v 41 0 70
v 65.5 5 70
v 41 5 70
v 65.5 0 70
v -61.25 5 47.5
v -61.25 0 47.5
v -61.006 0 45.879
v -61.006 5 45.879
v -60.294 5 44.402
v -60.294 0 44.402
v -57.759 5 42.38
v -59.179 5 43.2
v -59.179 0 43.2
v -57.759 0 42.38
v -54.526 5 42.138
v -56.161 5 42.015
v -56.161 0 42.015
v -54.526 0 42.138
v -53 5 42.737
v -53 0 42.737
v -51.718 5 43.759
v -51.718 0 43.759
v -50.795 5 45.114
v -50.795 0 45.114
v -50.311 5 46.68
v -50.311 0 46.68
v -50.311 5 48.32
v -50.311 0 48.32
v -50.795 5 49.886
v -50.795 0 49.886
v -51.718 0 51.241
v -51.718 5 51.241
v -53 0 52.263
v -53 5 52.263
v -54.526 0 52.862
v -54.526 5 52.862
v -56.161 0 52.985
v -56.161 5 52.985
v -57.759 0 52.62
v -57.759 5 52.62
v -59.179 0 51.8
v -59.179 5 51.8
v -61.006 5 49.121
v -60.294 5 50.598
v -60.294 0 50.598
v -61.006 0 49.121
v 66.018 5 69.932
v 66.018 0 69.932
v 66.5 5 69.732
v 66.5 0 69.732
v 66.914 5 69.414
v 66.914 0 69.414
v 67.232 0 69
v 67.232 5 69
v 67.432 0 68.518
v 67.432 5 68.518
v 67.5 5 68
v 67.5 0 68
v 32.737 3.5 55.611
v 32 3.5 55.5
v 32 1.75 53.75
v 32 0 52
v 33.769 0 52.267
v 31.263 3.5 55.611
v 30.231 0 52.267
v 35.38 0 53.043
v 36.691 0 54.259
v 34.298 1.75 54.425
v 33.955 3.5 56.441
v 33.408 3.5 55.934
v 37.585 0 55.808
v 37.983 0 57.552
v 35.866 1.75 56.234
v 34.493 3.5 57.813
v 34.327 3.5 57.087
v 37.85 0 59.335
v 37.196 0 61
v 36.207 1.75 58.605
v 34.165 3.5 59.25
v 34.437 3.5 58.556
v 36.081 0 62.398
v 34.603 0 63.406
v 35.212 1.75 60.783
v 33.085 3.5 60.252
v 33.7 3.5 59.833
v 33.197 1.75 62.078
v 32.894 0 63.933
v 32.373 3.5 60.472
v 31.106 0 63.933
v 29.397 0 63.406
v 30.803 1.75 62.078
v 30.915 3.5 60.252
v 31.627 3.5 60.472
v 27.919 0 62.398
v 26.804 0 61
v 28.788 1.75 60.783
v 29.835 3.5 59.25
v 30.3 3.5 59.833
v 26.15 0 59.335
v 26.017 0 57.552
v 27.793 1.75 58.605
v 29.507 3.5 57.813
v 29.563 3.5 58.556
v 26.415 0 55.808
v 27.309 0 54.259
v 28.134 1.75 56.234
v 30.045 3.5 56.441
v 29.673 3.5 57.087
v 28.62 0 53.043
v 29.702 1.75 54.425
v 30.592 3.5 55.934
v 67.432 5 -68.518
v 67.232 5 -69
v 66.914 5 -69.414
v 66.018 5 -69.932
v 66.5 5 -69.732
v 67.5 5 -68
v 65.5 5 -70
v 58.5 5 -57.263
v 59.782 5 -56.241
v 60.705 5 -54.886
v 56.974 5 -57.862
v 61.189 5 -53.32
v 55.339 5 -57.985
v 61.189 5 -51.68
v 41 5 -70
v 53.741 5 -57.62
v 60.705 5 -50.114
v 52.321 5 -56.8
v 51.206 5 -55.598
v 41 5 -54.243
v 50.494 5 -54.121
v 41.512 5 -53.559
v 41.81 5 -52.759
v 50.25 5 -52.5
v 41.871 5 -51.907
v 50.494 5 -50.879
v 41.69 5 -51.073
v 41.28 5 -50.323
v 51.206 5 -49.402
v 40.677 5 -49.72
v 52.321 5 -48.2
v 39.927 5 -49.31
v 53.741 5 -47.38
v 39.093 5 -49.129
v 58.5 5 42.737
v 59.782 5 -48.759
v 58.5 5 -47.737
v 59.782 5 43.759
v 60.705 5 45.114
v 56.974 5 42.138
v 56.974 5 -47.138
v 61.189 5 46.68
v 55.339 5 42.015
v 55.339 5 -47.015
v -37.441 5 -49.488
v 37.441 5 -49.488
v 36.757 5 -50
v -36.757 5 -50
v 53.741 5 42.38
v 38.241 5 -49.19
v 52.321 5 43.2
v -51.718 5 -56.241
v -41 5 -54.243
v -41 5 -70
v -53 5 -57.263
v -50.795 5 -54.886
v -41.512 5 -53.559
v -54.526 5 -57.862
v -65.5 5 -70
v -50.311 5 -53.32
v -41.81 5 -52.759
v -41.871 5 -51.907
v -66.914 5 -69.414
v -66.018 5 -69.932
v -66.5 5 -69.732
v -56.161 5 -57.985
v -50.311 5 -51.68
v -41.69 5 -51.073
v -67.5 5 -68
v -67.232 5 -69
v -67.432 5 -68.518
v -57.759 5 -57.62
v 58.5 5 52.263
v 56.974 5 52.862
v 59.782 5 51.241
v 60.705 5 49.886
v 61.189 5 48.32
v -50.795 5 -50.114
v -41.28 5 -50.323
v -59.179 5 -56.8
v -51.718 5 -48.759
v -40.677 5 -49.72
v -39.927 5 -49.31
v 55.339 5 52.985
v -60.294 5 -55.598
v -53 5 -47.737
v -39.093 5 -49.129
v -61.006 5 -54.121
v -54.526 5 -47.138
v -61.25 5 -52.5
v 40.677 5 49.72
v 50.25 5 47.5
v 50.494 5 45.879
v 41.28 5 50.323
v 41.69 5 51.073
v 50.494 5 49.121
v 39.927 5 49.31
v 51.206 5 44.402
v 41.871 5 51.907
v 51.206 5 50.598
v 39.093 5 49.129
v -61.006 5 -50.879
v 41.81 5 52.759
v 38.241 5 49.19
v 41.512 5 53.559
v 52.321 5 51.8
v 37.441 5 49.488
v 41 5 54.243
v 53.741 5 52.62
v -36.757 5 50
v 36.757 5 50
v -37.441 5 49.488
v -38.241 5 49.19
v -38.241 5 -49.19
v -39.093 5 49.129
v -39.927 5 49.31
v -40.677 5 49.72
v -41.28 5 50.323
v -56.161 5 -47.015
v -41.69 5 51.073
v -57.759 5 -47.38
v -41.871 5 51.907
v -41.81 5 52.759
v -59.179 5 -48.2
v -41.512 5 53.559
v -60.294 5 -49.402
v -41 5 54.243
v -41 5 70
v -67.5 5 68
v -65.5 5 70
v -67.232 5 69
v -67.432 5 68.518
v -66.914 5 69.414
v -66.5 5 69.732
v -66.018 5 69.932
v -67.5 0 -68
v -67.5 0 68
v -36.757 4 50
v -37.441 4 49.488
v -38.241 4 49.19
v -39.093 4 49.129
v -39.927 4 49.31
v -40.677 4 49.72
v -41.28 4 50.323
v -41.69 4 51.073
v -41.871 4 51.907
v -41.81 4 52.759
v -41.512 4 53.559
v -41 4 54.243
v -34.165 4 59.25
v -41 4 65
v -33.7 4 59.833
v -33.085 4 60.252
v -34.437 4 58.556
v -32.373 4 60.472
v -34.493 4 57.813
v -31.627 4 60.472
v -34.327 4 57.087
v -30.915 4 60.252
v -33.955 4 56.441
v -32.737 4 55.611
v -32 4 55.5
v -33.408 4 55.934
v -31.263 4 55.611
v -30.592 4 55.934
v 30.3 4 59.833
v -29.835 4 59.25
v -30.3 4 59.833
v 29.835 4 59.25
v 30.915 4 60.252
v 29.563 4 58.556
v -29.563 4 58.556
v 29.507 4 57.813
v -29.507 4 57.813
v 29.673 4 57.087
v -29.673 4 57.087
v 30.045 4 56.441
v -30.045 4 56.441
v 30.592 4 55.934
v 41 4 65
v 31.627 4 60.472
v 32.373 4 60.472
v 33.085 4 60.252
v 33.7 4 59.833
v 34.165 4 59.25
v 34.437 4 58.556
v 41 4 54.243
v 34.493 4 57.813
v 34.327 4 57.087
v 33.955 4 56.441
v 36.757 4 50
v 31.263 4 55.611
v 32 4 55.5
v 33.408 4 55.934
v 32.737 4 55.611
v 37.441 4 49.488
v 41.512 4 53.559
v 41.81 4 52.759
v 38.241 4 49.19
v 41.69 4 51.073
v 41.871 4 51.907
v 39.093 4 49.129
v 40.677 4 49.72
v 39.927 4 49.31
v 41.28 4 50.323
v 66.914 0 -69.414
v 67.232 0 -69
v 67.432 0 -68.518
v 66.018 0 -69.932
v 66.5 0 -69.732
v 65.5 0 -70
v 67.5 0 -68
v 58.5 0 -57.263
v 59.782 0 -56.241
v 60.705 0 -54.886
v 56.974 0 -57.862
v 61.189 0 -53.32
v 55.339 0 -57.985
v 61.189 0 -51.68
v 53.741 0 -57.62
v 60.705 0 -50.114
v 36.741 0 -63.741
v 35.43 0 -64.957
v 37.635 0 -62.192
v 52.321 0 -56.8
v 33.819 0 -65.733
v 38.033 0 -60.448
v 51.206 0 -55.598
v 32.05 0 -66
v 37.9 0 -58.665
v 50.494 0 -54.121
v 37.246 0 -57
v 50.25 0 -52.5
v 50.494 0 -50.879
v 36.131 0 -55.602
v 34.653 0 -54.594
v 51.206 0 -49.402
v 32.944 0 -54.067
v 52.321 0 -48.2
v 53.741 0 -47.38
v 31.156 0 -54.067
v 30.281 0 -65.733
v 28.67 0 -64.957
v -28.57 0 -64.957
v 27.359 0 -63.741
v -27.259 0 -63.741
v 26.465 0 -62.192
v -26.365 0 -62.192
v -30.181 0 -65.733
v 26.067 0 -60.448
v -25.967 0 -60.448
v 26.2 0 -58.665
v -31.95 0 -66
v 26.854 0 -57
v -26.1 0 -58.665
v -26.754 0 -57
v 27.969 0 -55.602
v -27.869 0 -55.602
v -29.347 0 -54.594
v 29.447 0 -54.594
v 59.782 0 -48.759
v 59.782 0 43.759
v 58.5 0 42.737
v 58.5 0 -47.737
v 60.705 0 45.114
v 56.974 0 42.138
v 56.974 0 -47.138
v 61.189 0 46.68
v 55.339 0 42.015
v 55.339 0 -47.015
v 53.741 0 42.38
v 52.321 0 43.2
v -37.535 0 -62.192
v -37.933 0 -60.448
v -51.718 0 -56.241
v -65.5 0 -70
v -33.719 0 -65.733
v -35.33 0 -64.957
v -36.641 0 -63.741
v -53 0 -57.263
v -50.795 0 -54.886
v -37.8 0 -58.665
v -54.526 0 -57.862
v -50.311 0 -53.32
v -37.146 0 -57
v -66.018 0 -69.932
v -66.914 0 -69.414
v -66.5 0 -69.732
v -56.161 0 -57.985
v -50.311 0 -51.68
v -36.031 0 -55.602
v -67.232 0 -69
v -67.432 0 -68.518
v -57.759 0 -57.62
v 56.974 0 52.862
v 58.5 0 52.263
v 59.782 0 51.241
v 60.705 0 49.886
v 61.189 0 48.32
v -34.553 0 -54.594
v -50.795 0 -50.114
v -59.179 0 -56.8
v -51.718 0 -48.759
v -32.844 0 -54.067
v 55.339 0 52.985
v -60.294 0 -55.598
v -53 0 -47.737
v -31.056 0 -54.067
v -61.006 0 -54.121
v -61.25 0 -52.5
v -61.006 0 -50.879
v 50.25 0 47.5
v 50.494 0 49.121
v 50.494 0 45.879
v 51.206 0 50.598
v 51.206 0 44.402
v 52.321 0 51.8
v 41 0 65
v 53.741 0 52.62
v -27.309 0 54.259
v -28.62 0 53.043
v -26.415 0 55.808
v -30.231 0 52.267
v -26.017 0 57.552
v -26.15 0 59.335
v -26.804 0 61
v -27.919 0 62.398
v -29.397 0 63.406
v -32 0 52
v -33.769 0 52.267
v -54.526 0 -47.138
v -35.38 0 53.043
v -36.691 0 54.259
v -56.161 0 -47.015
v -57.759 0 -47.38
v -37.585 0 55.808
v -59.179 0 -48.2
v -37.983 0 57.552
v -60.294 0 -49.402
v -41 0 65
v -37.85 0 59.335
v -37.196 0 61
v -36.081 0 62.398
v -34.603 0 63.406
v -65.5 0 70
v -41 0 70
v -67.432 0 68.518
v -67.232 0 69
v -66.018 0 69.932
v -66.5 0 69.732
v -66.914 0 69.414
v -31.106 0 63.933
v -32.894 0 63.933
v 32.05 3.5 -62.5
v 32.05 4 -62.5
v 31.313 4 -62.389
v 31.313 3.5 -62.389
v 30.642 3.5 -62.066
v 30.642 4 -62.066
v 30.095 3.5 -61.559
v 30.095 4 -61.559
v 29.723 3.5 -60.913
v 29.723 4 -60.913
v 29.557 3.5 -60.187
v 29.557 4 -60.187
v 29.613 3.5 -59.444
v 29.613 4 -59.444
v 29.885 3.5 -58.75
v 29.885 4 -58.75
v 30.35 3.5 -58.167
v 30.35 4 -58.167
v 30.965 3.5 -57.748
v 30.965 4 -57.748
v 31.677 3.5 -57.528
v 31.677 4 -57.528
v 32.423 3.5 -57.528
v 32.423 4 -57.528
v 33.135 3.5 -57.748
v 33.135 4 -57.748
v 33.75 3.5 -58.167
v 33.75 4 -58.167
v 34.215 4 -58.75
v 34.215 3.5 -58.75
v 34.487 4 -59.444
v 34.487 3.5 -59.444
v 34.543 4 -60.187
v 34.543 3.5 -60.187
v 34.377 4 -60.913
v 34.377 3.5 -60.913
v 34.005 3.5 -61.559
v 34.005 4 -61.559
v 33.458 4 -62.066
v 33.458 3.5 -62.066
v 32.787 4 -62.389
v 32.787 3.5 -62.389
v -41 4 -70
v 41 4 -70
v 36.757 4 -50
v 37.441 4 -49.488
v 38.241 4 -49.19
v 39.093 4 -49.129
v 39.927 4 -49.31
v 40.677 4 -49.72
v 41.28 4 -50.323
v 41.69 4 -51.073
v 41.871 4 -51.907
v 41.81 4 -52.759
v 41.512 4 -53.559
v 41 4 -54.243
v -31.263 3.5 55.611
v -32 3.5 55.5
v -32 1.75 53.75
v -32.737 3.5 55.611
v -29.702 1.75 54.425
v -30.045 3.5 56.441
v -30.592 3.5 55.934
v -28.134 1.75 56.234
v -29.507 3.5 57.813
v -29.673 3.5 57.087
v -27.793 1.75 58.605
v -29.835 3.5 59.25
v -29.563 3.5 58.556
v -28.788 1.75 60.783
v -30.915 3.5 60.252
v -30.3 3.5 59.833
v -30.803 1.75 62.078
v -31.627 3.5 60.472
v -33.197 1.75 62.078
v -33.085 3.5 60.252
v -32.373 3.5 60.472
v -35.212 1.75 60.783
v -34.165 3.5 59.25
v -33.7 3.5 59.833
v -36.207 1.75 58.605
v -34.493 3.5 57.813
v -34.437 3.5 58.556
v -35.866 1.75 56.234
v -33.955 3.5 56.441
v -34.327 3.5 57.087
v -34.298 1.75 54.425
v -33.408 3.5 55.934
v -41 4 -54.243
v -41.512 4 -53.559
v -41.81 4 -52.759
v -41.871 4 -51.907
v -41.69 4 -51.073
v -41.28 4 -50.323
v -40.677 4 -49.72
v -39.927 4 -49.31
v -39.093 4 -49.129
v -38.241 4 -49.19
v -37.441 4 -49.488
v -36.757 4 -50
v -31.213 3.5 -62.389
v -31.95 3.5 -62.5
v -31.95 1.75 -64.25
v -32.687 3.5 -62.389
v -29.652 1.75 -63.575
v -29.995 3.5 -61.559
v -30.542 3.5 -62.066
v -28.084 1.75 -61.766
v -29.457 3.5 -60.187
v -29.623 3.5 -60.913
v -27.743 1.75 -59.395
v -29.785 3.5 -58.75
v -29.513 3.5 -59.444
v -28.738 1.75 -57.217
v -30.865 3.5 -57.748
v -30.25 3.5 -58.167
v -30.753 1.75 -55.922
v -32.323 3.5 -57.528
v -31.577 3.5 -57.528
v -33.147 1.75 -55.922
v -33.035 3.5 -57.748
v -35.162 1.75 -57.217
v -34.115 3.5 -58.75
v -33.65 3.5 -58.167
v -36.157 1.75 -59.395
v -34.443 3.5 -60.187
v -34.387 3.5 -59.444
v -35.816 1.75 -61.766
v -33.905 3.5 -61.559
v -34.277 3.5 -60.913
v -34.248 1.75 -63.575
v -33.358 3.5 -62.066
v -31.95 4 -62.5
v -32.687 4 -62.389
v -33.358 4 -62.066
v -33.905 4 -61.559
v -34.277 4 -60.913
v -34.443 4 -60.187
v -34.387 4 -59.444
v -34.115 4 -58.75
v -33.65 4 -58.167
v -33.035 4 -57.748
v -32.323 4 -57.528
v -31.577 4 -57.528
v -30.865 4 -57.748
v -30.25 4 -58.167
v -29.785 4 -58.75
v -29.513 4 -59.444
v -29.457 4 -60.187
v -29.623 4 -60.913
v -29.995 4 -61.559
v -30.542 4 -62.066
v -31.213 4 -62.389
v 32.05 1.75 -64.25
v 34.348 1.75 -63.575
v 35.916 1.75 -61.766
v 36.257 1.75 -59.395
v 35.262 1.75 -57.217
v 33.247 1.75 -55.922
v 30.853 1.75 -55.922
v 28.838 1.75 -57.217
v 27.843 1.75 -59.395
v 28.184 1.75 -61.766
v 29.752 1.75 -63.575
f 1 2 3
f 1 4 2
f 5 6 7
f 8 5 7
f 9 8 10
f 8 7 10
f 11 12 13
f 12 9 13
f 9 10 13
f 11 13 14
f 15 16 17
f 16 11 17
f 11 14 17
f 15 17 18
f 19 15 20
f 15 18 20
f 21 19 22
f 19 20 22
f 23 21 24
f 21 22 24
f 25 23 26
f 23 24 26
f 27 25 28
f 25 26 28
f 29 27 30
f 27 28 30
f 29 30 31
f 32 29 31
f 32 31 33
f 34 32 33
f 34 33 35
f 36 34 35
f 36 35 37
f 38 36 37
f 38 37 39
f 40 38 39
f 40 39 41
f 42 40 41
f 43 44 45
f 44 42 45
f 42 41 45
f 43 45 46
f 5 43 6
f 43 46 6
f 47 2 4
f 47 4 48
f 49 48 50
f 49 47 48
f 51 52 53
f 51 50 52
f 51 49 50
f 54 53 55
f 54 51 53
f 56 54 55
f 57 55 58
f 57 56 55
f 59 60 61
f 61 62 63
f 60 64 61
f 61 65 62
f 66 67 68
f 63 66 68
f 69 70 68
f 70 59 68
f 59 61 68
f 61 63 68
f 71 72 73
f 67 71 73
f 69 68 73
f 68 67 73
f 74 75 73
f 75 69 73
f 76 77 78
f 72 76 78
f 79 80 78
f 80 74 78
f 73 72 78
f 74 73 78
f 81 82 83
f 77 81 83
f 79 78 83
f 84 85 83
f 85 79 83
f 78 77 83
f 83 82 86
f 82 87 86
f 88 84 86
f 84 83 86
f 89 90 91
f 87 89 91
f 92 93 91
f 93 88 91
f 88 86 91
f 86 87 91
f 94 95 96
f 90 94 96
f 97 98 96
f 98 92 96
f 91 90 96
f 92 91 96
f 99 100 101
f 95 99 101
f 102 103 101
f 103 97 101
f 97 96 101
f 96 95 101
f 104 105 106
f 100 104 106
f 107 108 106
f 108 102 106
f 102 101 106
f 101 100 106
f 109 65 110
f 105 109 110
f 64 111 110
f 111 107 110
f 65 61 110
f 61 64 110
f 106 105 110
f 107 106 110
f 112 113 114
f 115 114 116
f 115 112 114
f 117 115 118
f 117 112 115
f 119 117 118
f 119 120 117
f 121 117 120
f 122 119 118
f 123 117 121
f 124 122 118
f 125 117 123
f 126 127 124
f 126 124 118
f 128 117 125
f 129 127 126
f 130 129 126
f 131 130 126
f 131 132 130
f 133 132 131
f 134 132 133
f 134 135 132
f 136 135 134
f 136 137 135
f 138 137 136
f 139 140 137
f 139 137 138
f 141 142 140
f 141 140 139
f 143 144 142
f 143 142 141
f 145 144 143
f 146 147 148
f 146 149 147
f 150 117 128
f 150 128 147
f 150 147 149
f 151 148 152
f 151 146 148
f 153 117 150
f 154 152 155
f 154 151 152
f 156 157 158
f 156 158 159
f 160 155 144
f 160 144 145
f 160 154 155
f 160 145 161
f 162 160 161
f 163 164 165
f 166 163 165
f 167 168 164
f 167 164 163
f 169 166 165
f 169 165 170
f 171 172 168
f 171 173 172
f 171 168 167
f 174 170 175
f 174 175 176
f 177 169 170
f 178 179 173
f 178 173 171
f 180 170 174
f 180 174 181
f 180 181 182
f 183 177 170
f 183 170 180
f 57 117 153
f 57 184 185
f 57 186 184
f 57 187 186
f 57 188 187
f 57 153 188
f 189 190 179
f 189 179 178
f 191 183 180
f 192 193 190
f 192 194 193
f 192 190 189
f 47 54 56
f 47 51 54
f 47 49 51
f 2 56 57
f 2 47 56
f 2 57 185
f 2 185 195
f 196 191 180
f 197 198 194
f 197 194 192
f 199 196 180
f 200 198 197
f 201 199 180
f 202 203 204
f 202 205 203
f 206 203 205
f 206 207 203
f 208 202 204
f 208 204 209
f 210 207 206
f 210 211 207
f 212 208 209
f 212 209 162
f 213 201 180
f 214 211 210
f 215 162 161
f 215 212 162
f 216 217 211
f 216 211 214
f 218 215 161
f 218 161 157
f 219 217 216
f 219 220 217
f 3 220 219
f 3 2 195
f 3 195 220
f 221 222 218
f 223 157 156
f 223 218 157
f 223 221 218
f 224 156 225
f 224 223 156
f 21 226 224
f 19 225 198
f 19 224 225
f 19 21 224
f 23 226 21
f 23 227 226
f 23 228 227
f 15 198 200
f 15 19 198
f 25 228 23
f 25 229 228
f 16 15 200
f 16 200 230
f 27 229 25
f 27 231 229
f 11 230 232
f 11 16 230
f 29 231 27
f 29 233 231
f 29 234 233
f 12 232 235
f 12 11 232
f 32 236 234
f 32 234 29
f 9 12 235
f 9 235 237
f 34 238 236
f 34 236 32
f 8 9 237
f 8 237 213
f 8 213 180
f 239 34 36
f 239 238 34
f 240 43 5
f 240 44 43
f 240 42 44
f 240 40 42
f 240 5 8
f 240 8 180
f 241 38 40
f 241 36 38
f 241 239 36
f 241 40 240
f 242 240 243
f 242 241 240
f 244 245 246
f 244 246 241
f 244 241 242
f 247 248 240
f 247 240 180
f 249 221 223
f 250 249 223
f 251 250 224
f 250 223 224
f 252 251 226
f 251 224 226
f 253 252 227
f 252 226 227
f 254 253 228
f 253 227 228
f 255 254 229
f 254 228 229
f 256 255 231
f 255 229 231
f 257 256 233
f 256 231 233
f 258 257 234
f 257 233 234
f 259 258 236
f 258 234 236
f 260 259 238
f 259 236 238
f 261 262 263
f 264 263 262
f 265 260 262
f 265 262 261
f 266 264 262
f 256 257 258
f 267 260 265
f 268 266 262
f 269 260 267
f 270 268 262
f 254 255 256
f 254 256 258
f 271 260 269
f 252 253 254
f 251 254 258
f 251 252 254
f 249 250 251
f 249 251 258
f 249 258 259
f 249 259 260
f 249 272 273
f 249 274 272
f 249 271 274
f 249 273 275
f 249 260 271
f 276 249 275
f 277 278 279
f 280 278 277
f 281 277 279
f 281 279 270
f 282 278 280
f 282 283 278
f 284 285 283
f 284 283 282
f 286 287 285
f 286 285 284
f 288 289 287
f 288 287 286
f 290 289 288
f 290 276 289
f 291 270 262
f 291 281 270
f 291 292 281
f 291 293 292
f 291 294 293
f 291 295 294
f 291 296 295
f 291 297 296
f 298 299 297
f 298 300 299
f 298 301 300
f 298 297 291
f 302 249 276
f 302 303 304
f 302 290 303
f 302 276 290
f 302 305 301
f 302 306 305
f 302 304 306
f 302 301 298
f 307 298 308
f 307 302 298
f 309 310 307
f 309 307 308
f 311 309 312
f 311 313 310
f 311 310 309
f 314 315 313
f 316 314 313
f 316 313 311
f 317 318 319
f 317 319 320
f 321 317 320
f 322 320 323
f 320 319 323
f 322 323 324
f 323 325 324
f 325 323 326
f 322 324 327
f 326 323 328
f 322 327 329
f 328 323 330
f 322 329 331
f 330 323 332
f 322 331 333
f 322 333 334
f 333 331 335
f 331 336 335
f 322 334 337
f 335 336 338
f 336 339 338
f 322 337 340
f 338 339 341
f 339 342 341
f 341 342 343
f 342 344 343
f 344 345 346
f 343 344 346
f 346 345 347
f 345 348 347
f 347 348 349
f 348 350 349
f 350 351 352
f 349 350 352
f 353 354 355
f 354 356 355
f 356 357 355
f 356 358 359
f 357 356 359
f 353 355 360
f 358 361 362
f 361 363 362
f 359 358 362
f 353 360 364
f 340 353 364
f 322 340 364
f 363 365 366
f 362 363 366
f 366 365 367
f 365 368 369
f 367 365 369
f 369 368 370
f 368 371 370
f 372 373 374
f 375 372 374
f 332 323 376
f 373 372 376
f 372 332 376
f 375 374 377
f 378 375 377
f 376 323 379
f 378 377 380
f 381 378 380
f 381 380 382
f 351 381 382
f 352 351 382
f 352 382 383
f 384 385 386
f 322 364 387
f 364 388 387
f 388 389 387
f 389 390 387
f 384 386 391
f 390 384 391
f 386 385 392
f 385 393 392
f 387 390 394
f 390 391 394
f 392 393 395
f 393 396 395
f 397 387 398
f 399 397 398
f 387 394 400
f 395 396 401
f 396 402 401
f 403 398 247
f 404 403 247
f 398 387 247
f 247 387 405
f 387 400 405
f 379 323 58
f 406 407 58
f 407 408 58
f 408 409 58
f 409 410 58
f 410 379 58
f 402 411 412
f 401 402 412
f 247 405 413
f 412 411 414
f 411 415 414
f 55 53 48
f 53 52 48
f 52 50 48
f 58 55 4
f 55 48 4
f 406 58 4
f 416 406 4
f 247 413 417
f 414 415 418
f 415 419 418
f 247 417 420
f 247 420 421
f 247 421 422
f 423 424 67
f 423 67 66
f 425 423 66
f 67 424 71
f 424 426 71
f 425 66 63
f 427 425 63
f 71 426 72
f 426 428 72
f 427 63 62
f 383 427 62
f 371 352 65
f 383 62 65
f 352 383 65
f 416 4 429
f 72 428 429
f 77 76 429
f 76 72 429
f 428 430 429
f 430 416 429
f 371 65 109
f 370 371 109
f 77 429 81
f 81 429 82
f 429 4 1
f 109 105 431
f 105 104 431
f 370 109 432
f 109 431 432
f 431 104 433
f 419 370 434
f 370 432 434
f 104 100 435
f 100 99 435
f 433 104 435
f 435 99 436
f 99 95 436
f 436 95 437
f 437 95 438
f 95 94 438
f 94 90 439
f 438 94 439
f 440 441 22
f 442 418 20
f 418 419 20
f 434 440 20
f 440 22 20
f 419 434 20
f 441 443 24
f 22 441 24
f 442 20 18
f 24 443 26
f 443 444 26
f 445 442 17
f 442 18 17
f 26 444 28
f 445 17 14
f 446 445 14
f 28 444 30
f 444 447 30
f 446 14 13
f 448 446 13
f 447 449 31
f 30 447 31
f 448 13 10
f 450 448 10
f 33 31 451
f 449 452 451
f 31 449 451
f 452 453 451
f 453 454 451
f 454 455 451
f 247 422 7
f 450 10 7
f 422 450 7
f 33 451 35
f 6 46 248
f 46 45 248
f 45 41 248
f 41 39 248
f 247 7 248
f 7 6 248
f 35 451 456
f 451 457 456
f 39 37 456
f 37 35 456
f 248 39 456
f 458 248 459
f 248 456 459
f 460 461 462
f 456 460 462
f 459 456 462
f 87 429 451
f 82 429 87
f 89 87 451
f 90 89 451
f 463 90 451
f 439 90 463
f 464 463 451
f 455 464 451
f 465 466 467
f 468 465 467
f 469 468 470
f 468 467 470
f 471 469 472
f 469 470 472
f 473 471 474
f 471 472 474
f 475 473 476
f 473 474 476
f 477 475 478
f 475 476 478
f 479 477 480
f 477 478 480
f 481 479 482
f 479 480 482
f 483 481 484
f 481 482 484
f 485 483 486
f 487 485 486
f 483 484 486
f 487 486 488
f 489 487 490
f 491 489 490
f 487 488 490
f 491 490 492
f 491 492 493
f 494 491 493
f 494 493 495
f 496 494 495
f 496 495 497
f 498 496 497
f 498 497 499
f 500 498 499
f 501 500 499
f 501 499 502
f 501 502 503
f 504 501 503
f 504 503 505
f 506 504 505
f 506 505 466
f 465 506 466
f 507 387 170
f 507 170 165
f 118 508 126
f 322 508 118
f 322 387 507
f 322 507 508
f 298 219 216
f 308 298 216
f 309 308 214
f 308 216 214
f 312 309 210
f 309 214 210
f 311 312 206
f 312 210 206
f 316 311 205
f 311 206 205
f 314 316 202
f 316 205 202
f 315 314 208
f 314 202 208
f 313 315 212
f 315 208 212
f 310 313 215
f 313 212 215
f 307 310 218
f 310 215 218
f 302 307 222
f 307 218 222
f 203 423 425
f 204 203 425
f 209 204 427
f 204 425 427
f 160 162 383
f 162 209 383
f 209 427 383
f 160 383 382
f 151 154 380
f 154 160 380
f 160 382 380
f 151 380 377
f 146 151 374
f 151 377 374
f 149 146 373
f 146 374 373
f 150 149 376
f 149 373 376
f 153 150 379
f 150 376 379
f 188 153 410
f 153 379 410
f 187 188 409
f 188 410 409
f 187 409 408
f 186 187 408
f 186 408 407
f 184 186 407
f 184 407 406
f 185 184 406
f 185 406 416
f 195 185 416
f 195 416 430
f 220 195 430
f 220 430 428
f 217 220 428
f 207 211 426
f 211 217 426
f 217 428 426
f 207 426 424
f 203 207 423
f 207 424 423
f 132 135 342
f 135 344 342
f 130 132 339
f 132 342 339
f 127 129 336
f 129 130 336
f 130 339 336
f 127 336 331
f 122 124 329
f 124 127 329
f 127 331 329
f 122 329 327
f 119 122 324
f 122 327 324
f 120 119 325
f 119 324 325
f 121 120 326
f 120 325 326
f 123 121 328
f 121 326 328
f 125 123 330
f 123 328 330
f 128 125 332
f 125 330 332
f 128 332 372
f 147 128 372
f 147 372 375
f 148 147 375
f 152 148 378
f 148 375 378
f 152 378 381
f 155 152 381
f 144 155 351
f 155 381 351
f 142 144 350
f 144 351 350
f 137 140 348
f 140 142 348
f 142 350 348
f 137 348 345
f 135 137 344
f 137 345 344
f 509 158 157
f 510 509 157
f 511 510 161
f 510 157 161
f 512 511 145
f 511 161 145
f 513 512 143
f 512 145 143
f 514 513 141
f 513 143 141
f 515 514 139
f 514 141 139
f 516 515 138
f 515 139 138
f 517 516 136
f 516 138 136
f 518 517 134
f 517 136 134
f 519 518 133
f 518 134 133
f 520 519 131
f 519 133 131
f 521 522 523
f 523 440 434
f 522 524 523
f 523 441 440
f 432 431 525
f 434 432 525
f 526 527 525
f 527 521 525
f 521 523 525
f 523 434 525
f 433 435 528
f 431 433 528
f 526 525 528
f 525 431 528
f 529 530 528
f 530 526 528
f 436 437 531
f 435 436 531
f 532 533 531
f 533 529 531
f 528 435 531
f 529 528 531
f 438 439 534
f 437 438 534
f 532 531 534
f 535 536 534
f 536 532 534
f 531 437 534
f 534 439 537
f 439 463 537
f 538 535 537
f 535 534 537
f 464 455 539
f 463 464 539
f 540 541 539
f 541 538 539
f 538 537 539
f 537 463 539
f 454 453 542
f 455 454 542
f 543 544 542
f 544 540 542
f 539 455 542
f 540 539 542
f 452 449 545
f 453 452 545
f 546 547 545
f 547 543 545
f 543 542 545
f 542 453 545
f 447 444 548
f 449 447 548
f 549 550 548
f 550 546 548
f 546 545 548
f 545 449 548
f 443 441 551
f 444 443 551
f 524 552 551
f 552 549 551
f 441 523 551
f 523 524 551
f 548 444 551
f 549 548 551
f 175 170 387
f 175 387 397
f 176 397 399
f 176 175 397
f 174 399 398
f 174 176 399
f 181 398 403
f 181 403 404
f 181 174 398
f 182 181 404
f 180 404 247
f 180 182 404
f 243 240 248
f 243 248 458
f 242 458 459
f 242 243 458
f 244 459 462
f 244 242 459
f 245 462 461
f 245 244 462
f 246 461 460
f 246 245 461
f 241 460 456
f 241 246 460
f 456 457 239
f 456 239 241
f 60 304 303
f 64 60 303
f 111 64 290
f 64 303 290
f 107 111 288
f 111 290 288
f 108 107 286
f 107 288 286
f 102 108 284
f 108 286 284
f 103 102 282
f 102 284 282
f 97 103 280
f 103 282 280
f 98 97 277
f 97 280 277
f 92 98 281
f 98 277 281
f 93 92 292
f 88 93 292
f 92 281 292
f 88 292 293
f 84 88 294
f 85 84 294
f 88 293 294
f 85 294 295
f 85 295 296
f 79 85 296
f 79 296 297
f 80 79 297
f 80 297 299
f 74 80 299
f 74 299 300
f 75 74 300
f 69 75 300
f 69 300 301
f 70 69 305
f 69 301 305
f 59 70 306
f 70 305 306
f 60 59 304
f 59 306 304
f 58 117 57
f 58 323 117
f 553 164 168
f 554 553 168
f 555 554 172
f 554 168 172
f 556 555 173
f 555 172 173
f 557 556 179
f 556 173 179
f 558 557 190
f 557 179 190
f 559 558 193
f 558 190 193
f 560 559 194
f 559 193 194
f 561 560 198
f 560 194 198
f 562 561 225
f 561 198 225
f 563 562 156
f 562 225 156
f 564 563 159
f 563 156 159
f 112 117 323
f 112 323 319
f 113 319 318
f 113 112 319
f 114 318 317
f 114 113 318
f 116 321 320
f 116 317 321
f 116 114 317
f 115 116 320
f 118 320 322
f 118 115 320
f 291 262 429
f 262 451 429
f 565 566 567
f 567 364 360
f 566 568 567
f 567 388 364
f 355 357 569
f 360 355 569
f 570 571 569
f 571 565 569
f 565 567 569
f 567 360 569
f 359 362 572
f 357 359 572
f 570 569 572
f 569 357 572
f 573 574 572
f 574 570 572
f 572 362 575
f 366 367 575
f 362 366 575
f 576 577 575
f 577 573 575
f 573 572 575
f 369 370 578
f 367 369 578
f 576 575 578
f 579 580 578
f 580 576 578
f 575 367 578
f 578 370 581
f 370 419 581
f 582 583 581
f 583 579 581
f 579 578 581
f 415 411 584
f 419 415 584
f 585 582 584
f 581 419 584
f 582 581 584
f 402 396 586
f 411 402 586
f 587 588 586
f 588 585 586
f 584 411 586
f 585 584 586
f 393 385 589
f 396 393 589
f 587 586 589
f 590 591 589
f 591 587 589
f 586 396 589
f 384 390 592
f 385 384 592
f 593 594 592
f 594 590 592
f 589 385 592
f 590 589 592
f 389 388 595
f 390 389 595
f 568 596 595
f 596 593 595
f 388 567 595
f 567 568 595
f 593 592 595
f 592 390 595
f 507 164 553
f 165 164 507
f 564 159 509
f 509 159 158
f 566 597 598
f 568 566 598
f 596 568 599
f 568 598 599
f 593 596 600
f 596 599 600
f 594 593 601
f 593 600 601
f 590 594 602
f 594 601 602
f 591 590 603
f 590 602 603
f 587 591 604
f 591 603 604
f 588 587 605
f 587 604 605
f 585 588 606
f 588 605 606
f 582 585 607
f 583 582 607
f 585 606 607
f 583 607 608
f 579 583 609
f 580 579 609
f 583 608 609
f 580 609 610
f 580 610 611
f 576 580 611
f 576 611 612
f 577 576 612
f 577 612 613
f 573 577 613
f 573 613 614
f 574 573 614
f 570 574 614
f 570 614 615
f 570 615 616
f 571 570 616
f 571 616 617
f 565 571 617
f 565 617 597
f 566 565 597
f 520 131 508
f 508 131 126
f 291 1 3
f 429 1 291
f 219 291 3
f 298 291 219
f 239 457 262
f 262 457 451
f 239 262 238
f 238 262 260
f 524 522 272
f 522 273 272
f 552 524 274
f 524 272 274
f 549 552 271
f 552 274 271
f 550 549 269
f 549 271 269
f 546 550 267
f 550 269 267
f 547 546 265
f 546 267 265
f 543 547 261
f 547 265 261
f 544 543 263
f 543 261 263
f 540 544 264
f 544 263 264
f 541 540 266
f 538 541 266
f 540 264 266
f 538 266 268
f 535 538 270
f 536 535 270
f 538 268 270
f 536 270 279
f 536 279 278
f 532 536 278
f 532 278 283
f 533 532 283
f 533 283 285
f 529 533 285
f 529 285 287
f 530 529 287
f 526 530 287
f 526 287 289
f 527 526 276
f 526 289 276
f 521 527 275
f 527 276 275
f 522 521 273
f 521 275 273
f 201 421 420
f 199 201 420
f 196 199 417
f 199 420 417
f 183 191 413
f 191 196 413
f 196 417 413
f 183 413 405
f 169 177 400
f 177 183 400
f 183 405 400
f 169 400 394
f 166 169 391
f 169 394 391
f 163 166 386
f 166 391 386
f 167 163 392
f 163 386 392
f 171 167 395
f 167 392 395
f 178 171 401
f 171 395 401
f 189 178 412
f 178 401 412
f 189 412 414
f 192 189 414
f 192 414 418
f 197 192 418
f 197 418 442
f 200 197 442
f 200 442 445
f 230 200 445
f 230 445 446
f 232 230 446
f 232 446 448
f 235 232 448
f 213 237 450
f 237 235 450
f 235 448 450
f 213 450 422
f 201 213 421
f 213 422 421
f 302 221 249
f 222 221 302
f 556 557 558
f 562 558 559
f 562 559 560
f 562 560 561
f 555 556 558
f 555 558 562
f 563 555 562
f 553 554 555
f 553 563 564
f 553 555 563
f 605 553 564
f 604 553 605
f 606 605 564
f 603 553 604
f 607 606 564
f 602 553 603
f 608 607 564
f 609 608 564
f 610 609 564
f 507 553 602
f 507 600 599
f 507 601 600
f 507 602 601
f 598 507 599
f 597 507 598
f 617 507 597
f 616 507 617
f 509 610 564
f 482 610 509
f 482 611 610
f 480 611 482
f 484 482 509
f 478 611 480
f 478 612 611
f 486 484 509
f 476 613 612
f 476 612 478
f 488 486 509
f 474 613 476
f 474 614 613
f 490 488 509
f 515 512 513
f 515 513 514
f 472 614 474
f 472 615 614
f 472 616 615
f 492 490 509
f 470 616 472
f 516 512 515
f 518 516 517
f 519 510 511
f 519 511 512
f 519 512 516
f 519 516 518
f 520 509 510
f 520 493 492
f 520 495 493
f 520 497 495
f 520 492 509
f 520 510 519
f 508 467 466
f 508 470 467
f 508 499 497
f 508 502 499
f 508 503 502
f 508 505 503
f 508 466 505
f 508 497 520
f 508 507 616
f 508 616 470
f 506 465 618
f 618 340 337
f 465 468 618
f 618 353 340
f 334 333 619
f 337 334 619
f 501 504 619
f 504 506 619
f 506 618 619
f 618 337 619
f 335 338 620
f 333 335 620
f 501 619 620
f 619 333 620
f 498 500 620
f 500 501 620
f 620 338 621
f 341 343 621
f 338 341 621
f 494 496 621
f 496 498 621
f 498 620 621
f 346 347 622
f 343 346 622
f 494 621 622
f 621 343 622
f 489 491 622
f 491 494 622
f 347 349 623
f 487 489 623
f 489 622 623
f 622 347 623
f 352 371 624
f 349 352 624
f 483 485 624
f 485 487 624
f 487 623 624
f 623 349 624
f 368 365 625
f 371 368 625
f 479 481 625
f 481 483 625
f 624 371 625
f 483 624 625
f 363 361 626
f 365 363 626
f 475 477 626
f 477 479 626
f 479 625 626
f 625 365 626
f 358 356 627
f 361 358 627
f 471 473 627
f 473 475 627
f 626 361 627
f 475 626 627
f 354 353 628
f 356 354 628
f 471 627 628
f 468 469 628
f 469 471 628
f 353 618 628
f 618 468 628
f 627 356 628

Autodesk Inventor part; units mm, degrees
ref_plane "YZ Plane" through (0, 0, 0) normal (1, 0, 0) x (0, 1, 0)
ref_plane "XZ Plane" through (0, 0, 0) normal (0, 1, 0) x (-1, 0, 0)
ref_plane "XY Plane" through (0, 0, 0) normal (0, 0, 1) x (1, 0, 0)
sketch "Sketch1" plane through (0, 0, 0) normal (0, 1, 0) x (-1, 0, 0)
  line L0 (67.5, -70) -> (-67.5, -70)
  line L1 (-67.5, -70) -> (-67.5, 70)
  line L2 (-67.5, 70) -> (67.5, 70)
  line L3 (67.5, 70) -> (67.5, -70)
  line L4 (67.5, -70) -> (-67.5, 70) construction
  line L5 (-67.5, -70) -> (67.5, 70) construction
  circle A0 centre (-55.75, -52.5) radius 5.5
  circle A1 centre (55.75, -52.5) radius 5.5
  circle A2 centre (55.75, 47.5) radius 5.5
  circle A3 centre (-55.75, 47.5) radius 5.5
  line L6 (55.75, -52.5) -> (-55.75, -52.5) construction
  line L7 (55.75, 47.5) -> (-55.75, 47.5) construction
  line L8 (0, -70) -> (0, -52.5) construction
  line L9 (0, -52.5) -> (0, 0) construction
  line L10 (0, 0) -> (0, 47.5) construction
  line L11 (0, 70) -> (0, 47.5) construction
  point P0 (0, 0)
  point P1 (0, 0)
  point P2 (0, 0)
  dimension "d0" = 135
  dimension "d1" = 140
  dimension "d2" = 11
  dimension "d4" = 11
  dimension "d5" = 11
  dimension "d6" = 11
  dimension "d7" = 111.5
  dimension "d9" = 100
  dimension "d27" = 22.5
extrude "Extrusion1" add sketch "Sketch1" along normal blind 5
sketch "Sketch3" plane through (0, 5, 0) normal (0, 1, 0) x (1, 0, 0)
  circle A0 centre (55.75, -47.5) radius 5.5 construction
  circle A1 centre (-55.75, -47.5) radius 5.5 construction
  circle A2 centre (-55.75, 52.5) radius 5.5 construction
  circle A3 centre (55.75, 52.5) radius 5.5 construction
  line L0 (67.5, 70) -> (-67.5, 70) construction
  line L1 (-67.5, 70) -> (-67.5, -70) construction
  line L2 (-67.5, -70) -> (67.5, -70) construction
  line L3 (67.5, -70) -> (67.5, 70) construction
  line L4 (-41, -70) -> (41, -70)
  line L5 (-36.7574, -50) -> (36.7574, -50)
  line L6 (-41, -54.2426) -> (-41, -70)
  line L7 (41, -54.2426) -> (41, -70)
  line L8 (-67.5, -70) -> (67.5, -70) construction
  line L9 (-67.5, 70) -> (-67.5, -70) construction
  line L10 (-67.5, 0) -> (67.5, 0) construction
  line L11 (67.5, -70) -> (67.5, 70) construction
  arc A4 (-36.7574, -50) -> (-41, -54.2426) centre (-38.8787, -52.1213) ccw
  line L12 (-41, -50) -> (-38.8787, -52.1213) construction
  line L13 (0, -50) -> (0, -70) construction
  arc A5 (41, -54.2426) -> (36.7574, -50) centre (38.8787, -52.1213) ccw
  line L14 (-41, 70) -> (41, 70)
  line L15 (-36.7574, 50) -> (36.7574, 50)
  line L16 (-41, 54.2426) -> (-41, 70)
  line L17 (41, 54.2426) -> (41, 70)
  arc A6 (-41, 54.2426) -> (-36.7574, 50) centre (-38.8787, 52.1213) ccw
  line L18 (-41, 50) -> (-38.8787, 52.1213) construction
  line L19 (0, 50) -> (0, 70) construction
  arc A7 (36.7574, 50) -> (41, 54.2426) centre (38.8787, 52.1213) ccw
  circle A8 centre (55.75, -47.5) radius 5.5 projected
  circle A9 centre (-55.75, -47.5) radius 5.5 projected
  circle A10 centre (-55.75, 52.5) radius 5.5 projected
  circle A11 centre (55.75, 52.5) radius 5.5 projected
  line L20 (-67.5, 70) -> (67.5, 70) projected
  line L21 (67.5, 70) -> (67.5, -70) projected
  line L22 (67.5, -70) -> (-67.5, -70) projected
  line L23 (-67.5, -70) -> (-67.5, 70) projected
  point P0 (0, 0)
  point P1 (41, -50)
  point P2 (0, -70)
  point P3 (0, -70)
  point P4 (41, 50)
  point P5 (0, 70)
  point P6 (0, 70)
  dimension "d19" = 82
  dimension "d20" = 20
  dimension "d67" = 6
  dimension "d68" = 45
  dimension "d70" = 73.5147
  dimension "d71" = 15.7574
  dimension "d72" = 120
  dimension "d73" = 26.5
extrude "Extrusion3" cut sketch "Sketch3" against normal blind 1 contours L6 A4 L5 A5 L7 L4 | L14 L17 A7 L15 A6 L16
fillet "Fillet1" radius 2 4 edges at (67.5, 2.5, 70) (-67.5, 2.5, 70) (-67.5, 2.5, -70) (67.5, 2.5, -70)
sketch "Sketch4" plane through (0, 0, 0) normal (0, -1, 0) x (1, 0, 0)
  arc A0 (65.5, -70) -> (67.5, -68) centre (65.5, -68) ccw construction
  line L0 (67.5, -68) -> (67.5, 68) construction
  arc A1 (67.5, 68) -> (65.5, 70) centre (65.5, 68) ccw construction
  line L1 (65.5, 70) -> (-65.5, 70) construction
  arc A2 (-65.5, 70) -> (-67.5, 68) centre (-65.5, 68) ccw construction
  line L2 (-67.5, 68) -> (-67.5, -68) construction
  arc A3 (-67.5, -68) -> (-65.5, -70) centre (-65.5, -68) ccw construction
  line L3 (-65.5, -70) -> (65.5, -70) construction
  circle A4 centre (55.75, 47.5) radius 5.5 construction
  circle A5 centre (-55.75, 47.5) radius 5.5 construction
  circle A6 centre (-55.75, -52.5) radius 5.5 construction
  circle A7 centre (55.75, -52.5) radius 5.5 construction
  line L4 (-41, 70) -> (41, 70)
  line L5 (-41, 65) -> (41, 65)
  line L6 (-41, 70) -> (-41, 65)
  line L7 (41, 70) -> (41, 65)
  line L8 (65.5, 70) -> (-65.5, 70) construction
  point P0 (0, 0)
  point P1 (0, 70)
  point P2 (0, 70)
  point P3 (0, 70)
  dimension "d30" = 82
  dimension "d31" = 5
extrude "Extrusion4" cut sketch "Sketch4" against normal up to next
sketch "Sketch7" plane through (0, 0, 0) normal (0, -1, 0) x (1, 0, 0)
  arc A0 (67.5, 68) -> (65.5, 70) centre (65.5, 68) ccw projected
  line L0 (67.5, 68) -> (40.95, 68) construction
  line L1 (41, 70) -> (65.5, 70) projected
  line L2 (40.95, 68) -> (41, 70)
  line L3 (41, 70) -> (32, 70) construction
  line L4 (32, 70) -> (32, 58) construction
  circle A1 centre (32, 58) radius 3
  line L5 (32, 58) -> (-32, 58) construction
  circle A2 centre (-32, 58) radius 3
  line L6 (-67.5, -70) -> (-40.95, -70) construction
  line L7 (-65.5, -70) -> (65.5, -70) projected
  line L8 (-40.95, -70) -> (-31.95, -70) construction
  line L9 (-31.95, -70) -> (-31.95, -60) construction
  line L10 (-31.95, -60) -> (32.05, -60) construction
  circle A3 centre (-31.95, -60) radius 3
  circle A4 centre (32.05, -60) radius 3
  point P0 (0, 0)
  dimension "d78" = 26.55
  dimension "d79" = 9
  dimension "d80" = 12
  dimension "d81" = 6
  dimension "d82" = 64
  dimension "d84" = 6
  dimension "d85" = 26.55
  dimension "d86" = 9
  dimension "d87" = 10
  dimension "d88" = 64
  dimension "d89" = 6
  dimension "d90" = 6
  dimension "d92" = 63.95
hole "Hole3" at (32, 0, 58) at (-32, 0, 58) at (-31.95, 0, -60) at (32.05, 0, -60) direction (0, 1, 0) diameter 5 end through all countersink diameter 12 countersink angle 90
properties material "Aluminum 6061"
